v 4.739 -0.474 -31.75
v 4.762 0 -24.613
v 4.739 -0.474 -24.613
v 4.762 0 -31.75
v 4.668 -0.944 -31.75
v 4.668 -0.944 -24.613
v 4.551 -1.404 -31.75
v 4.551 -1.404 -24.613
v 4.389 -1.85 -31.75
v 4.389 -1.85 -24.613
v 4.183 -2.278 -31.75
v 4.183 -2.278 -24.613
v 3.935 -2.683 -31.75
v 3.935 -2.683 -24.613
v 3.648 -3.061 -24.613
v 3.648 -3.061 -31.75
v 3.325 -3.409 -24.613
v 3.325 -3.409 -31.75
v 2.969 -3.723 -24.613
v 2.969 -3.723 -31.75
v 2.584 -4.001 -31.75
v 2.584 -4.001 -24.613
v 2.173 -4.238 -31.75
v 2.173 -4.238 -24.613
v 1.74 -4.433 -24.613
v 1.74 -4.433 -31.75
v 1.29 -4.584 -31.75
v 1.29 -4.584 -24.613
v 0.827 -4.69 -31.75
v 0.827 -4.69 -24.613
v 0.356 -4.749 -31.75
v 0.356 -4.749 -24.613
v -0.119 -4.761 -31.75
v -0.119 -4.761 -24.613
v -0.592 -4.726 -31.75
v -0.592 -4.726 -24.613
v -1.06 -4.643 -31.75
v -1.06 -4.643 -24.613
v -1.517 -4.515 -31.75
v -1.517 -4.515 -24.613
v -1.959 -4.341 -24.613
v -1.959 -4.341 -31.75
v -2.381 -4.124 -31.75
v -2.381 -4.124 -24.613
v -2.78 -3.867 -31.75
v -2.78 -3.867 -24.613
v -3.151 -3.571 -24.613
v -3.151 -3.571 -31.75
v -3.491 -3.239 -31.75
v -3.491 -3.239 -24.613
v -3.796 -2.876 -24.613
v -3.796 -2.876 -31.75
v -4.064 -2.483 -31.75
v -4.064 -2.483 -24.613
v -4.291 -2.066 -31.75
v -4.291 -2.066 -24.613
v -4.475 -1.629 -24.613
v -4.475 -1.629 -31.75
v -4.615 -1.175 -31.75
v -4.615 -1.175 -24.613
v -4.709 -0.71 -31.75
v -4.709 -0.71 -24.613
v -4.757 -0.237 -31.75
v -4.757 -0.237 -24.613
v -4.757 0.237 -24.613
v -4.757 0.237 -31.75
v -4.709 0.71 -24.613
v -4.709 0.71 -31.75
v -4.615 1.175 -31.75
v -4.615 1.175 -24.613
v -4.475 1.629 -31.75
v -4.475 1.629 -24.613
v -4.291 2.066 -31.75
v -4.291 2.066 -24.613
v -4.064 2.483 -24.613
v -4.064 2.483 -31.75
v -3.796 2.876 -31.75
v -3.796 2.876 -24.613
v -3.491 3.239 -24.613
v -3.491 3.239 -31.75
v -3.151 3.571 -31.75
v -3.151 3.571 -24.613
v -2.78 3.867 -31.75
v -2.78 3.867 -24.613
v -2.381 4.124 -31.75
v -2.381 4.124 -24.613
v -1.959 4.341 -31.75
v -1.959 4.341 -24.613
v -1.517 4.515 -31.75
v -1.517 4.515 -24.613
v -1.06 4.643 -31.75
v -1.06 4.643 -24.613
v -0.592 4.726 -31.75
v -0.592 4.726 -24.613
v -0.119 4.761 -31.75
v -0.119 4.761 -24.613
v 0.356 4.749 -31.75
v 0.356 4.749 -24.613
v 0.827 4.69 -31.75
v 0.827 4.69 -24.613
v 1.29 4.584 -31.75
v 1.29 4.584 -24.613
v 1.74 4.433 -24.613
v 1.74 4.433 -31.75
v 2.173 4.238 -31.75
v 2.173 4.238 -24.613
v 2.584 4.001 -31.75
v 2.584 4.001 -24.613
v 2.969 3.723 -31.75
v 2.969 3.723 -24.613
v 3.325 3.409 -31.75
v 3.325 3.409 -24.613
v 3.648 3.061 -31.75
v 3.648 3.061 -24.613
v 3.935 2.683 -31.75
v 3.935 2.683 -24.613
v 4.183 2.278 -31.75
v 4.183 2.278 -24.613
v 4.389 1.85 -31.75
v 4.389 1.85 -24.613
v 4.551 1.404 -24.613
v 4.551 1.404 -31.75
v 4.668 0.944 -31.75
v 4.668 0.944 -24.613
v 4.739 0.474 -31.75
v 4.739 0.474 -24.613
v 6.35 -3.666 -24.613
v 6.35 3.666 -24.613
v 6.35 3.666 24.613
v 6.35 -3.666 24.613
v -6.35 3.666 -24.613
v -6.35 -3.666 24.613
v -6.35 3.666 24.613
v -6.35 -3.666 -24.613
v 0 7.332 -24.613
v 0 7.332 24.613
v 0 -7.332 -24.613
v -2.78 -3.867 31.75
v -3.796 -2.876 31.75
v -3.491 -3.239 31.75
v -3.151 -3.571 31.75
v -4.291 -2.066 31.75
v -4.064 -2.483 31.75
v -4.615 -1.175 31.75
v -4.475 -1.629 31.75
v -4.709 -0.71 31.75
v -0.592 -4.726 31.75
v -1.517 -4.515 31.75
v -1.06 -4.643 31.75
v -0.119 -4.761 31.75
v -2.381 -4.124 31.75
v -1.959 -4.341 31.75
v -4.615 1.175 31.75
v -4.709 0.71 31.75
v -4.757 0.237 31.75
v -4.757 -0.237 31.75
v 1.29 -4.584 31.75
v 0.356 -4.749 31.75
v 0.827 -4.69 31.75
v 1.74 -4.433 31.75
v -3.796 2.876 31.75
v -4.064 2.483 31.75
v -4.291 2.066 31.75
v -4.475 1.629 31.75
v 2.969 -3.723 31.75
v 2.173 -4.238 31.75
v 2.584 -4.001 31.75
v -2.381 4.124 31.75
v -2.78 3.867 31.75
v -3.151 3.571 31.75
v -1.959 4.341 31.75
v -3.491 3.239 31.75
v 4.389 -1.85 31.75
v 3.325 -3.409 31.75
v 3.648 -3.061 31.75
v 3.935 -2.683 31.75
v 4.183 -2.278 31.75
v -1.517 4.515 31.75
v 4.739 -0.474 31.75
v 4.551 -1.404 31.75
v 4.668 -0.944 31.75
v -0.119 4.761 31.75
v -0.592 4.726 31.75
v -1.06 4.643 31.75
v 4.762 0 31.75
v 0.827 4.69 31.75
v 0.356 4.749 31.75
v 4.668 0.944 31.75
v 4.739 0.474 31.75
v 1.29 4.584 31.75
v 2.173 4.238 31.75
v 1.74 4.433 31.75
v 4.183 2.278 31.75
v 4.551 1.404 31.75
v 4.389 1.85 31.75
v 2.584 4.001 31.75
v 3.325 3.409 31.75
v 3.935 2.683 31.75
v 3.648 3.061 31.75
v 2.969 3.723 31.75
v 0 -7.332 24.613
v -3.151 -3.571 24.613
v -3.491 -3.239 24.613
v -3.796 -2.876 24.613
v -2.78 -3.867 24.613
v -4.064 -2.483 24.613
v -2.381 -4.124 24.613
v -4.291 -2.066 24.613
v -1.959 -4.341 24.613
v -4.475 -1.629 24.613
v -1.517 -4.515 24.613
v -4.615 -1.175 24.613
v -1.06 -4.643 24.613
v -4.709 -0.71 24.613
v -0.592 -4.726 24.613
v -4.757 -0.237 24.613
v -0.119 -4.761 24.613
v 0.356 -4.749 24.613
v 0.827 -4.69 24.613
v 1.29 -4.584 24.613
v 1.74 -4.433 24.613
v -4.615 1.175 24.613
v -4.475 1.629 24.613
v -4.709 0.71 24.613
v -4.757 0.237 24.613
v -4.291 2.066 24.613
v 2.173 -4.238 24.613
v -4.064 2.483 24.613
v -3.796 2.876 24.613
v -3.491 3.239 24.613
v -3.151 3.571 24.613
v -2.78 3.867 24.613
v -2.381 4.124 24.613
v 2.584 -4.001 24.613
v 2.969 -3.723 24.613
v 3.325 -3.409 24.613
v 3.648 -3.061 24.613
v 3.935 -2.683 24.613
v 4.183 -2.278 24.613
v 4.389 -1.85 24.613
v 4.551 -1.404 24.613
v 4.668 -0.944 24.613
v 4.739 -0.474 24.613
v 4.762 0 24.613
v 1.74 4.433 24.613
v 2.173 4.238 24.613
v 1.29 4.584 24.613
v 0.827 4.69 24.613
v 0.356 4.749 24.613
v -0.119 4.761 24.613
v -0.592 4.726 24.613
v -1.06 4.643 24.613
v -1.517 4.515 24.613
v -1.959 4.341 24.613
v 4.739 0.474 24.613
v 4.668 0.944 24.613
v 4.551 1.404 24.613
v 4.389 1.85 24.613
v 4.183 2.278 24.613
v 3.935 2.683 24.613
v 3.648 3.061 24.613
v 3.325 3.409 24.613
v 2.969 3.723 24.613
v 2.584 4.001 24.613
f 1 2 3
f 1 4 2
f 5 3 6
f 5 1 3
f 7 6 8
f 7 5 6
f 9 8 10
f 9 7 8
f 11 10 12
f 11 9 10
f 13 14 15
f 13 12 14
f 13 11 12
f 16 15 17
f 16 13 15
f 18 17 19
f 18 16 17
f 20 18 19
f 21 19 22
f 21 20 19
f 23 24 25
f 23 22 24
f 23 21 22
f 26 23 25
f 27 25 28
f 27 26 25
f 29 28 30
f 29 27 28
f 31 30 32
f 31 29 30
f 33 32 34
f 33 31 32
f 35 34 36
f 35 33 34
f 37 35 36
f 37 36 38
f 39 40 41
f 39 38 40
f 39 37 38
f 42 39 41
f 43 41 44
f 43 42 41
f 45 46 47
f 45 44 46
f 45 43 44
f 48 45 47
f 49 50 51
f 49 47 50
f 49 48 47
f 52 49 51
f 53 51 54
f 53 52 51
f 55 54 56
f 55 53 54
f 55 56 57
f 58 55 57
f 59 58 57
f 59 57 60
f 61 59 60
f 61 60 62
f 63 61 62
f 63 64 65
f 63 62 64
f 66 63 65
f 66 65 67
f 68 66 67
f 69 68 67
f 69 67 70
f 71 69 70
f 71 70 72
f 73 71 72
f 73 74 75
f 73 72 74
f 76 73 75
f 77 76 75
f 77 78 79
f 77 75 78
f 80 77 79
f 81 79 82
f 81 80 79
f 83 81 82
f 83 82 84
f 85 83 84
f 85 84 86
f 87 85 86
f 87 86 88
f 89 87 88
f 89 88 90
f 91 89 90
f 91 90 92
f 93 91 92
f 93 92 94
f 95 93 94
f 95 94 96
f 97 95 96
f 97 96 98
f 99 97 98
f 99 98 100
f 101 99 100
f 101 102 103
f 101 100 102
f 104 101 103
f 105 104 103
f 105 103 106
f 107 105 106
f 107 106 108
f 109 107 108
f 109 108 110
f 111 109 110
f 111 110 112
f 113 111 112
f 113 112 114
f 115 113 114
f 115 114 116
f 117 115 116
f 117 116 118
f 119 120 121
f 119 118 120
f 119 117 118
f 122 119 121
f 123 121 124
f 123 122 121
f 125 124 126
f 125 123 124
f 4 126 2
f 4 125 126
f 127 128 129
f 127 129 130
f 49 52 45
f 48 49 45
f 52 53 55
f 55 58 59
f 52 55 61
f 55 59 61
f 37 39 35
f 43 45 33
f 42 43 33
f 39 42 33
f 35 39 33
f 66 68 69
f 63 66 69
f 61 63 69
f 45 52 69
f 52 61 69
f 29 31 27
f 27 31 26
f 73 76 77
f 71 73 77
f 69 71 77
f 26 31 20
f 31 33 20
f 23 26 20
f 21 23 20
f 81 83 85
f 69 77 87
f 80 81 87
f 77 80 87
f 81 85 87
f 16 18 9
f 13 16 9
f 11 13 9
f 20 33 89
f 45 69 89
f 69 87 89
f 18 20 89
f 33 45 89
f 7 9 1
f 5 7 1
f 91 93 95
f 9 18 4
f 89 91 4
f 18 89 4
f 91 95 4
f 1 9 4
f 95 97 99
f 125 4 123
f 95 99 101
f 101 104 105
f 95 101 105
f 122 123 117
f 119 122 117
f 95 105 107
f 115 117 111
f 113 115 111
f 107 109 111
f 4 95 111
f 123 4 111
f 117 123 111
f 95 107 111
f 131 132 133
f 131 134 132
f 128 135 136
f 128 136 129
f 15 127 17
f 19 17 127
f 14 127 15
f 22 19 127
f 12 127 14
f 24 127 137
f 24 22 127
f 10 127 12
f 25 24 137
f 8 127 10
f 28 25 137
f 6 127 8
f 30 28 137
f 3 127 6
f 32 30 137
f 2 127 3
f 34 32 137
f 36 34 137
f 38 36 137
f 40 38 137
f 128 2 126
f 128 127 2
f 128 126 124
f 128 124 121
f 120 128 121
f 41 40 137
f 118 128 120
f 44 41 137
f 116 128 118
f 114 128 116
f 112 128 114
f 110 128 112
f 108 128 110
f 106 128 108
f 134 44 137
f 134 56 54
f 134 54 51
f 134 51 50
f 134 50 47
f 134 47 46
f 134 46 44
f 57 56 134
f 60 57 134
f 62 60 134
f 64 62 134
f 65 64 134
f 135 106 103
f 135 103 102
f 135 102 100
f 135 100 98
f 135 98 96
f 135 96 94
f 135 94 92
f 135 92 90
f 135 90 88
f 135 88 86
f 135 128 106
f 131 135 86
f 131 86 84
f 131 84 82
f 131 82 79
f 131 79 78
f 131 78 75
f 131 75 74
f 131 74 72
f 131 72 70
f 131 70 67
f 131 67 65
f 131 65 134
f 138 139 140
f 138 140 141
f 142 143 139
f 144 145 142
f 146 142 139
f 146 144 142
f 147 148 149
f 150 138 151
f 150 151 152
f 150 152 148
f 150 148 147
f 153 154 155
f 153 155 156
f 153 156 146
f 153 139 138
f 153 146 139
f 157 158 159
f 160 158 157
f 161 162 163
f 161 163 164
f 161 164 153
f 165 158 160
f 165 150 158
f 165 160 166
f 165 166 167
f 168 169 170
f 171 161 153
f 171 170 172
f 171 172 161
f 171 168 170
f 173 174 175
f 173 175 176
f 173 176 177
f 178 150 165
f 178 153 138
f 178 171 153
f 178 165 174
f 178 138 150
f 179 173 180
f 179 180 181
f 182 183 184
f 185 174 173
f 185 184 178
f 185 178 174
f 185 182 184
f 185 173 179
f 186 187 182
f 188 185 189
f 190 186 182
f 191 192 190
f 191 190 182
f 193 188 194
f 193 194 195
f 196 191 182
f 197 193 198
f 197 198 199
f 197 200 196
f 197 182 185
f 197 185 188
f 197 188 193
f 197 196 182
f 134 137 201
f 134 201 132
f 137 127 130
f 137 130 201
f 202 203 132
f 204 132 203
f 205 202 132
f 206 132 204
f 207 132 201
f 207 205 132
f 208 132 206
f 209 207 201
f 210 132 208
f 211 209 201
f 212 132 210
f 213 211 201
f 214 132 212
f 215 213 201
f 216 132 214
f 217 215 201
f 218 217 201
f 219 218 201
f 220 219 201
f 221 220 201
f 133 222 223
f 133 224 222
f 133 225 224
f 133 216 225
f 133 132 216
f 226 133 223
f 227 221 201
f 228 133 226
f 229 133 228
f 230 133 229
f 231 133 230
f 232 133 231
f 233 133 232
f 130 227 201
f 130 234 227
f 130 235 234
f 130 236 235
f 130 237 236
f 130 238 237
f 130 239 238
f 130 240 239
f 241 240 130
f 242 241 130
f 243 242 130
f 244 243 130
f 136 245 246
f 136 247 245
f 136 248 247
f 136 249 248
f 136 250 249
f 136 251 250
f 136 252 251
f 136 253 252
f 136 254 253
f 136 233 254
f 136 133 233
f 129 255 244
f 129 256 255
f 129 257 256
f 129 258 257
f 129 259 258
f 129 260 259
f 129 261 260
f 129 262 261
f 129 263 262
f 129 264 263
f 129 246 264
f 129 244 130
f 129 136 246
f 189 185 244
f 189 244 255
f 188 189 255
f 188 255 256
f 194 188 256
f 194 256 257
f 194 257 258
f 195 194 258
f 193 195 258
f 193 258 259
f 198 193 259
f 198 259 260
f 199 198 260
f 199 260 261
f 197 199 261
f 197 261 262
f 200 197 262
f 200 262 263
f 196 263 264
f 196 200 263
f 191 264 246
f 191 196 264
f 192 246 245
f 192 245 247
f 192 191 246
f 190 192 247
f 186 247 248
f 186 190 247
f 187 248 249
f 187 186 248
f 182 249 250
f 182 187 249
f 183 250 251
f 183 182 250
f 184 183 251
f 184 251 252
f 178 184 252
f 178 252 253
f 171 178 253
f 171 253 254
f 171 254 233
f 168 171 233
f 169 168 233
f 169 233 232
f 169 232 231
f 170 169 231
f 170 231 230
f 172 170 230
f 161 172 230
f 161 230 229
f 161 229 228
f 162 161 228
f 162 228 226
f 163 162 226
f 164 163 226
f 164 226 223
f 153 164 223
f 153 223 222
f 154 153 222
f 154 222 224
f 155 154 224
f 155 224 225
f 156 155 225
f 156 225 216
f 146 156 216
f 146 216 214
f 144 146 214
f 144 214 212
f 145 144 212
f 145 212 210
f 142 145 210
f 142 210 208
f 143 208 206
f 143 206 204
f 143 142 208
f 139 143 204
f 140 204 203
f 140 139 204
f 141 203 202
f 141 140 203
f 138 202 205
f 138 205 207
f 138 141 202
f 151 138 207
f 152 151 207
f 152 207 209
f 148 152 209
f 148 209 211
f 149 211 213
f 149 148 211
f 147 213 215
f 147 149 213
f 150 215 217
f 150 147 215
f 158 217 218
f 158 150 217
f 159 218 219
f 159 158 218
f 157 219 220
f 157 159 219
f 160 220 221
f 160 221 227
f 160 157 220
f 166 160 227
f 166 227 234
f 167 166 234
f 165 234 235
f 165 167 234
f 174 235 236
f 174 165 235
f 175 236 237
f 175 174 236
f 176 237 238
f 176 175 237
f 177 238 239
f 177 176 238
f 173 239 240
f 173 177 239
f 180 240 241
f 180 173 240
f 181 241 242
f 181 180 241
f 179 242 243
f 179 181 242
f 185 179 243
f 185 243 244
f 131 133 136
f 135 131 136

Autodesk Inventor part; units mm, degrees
ref_plane "YZ Plane" through (0, 0, 0) normal (1, 0, 0) x (0, 1, 0)
ref_plane "XZ Plane" through (0, 0, 0) normal (0, 1, 0) x (-1, 0, 0)
ref_plane "XY Plane" through (0, 0, 0) normal (0, 0, 1) x (1, 0, 0)
sketch "Sketch1" plane through (0, 0, 0) normal (0, 0, 1) x (1, 0, 0)
  line L0 (0, 7.3323) -> (6.35, 3.6662)
  line L1 (6.35, 3.6662) -> (6.35, -3.6662)
  line L2 (6.35, -3.6662) -> (0, -7.3323)
  line L3 (0, -7.3323) -> (-6.35, -3.6662)
  line L4 (-6.35, -3.6662) -> (-6.35, 3.6662)
  line L5 (-6.35, 3.6662) -> (0, 7.3323)
  point P0 (0, 0)
  point P1 (0, 0)
  dimension "d0" = 12.7
extrude "Extrusion1" add sketch "Sketch1" along normal mid plane 63.5
sketch "Sketch4" plane through (0, 0, 31.75) normal (0, 0, 1) x (1, 0, 0)
  circle A0 centre (0, 0) radius 4.7625
  line L0 (-6.35, 3.6662) -> (-6.35, -3.6662) projected
  line L1 (-6.35, -3.6662) -> (0, -7.3323) projected
  line L2 (0, -7.3323) -> (6.35, -3.6662) projected
  line L3 (6.35, -3.6662) -> (6.35, 3.6662) projected
  line L4 (6.35, 3.6662) -> (0, 7.3323) projected
  line L5 (0, 7.3323) -> (-6.35, 3.6662) projected
  dimension "d7" = 9.525
extrude "Extrusion2" cut sketch "Sketch4" against normal blind 7.1374
mirror "Mirror1" about plane through (0, 0, 0) normal (0, 0, 1) of "Extrusion2"
properties part number "GearShaft" material "Steel, Alloy"
